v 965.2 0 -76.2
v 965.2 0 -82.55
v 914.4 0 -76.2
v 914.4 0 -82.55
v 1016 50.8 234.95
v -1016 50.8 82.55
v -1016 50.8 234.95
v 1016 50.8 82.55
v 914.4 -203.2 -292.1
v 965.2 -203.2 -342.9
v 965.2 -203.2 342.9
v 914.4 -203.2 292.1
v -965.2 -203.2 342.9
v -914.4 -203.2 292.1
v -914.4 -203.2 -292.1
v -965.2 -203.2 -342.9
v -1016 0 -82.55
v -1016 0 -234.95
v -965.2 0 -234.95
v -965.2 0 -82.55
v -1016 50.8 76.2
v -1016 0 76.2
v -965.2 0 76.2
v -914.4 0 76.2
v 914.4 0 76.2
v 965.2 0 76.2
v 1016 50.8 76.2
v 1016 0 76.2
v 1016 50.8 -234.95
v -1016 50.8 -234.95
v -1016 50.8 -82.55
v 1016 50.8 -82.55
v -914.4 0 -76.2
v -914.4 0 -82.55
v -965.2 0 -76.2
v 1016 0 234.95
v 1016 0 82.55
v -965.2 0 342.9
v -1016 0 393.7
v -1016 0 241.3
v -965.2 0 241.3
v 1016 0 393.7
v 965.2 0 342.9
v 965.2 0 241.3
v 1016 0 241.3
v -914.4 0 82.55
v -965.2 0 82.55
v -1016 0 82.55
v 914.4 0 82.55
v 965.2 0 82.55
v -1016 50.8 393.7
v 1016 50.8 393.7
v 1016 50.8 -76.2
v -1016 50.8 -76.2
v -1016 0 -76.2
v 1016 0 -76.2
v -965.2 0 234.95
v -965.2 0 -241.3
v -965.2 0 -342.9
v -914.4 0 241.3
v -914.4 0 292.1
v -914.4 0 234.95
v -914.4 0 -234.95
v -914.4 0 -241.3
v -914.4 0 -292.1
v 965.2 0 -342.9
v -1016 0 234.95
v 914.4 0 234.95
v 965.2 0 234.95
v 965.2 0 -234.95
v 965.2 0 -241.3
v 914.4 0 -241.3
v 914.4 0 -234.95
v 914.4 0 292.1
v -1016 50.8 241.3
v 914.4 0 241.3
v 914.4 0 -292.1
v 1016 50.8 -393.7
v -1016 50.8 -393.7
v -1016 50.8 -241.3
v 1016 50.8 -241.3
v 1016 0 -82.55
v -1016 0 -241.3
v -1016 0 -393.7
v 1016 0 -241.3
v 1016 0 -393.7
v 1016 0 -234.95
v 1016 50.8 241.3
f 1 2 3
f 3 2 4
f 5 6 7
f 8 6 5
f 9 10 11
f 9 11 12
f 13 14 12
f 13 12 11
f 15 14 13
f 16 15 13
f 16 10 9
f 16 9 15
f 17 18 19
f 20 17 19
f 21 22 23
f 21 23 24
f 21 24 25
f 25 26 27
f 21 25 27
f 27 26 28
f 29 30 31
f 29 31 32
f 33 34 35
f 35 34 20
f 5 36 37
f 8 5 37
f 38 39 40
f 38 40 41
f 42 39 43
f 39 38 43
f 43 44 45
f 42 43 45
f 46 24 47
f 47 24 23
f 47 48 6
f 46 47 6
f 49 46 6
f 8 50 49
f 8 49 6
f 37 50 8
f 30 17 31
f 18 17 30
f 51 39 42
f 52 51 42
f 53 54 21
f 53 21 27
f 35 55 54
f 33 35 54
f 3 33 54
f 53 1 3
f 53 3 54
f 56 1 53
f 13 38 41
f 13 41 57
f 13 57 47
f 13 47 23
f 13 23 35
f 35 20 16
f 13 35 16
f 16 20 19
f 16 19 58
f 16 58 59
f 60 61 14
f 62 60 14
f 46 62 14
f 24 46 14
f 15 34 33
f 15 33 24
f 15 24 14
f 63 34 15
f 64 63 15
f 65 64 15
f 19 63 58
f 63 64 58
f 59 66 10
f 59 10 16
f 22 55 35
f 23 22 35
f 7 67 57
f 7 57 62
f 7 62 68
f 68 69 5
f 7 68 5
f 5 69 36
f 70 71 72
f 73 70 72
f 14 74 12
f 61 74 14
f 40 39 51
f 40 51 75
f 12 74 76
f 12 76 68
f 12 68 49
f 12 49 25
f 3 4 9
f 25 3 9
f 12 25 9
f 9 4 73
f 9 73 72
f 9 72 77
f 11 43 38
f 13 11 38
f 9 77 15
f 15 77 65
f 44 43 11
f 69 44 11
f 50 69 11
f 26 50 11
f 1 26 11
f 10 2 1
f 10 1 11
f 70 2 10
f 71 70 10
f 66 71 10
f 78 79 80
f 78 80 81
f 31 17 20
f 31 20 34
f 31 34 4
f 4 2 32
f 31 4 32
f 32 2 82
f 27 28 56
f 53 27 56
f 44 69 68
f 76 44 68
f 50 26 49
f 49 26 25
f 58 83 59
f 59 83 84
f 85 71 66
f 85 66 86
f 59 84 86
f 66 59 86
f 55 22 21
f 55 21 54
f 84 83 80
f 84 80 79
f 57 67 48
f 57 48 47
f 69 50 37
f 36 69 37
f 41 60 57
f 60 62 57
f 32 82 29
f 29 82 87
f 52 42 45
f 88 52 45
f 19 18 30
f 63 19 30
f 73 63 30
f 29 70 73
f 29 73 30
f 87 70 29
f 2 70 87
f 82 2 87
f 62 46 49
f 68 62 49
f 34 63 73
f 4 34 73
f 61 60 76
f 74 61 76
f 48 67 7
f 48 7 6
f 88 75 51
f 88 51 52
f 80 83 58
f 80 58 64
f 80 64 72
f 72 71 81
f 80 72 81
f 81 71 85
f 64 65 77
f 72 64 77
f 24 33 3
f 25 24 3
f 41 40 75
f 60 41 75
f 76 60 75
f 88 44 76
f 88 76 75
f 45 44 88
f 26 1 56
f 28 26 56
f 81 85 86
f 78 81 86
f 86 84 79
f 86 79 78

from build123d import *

# Parameters (mm, degrees)
SKETCH1_W             = 2032
SKETCH1_H             = 152.4
BOSS_EXTRUDE1_DEPTH   = 50.8
BOSS_EXTRUDE1_2_DEPTH = 50.8
BOSS_EXTRUDE1_3_DEPTH = 50.8
BOSS_EXTRUDE1_4_DEPTH = 50.8
BOSS_EXTRUDE1_5_DEPTH = 50.8
SKETCH2_W             = 1930.4
SKETCH2_H             = 685.8
SKETCH2_W_2           = 1828.8
SKETCH2_H_2           = 584.2
BOSS_EXTRUDE2_DEPTH   = 203.2


with BuildPart() as part:
    # Sketch1 → Boss-Extrude1 (new body)
    with BuildSketch(Plane(origin=(0, 0, 0), x_dir=(1, 0, 0), z_dir=(0, 1, 0))):
        Rectangle(SKETCH1_W, SKETCH1_H)
    extrude(amount=BOSS_EXTRUDE1_DEPTH)



with BuildPart() as body_2:
    # Sketch1 → Boss-Extrude1 2 (new body)
    with BuildSketch(Plane(origin=(0, 0, 0), x_dir=(1, 0, 0), z_dir=(0, 1, 0))):
        with Locations((0, 158.75)):
            Rectangle(SKETCH1_W, SKETCH1_H)
    extrude(amount=BOSS_EXTRUDE1_2_DEPTH)


with BuildPart() as body_3:
    # Sketch1 → Boss-Extrude1 3 (new body)
    with BuildSketch(Plane(origin=(0, 0, 0), x_dir=(1, 0, 0), z_dir=(0, 1, 0))):
        with Locations((0, 317.5)):
            Rectangle(SKETCH1_W, SKETCH1_H)
    extrude(amount=BOSS_EXTRUDE1_3_DEPTH)


with BuildPart() as body_4:
    # Sketch1 → Boss-Extrude1 4 (new body)
    with BuildSketch(Plane(origin=(0, 0, 0), x_dir=(1, 0, 0), z_dir=(0, 1, 0))):
        with Locations((0, -158.75)):
            Rectangle(SKETCH1_W, SKETCH1_H)
    extrude(amount=BOSS_EXTRUDE1_4_DEPTH)


with BuildPart() as body_5:
    # Sketch1 → Boss-Extrude1 5 (new body)
    with BuildSketch(Plane(origin=(0, 0, 0), x_dir=(1, 0, 0), z_dir=(0, 1, 0))):
        with Locations((0, -317.5)):
            Rectangle(SKETCH1_W, SKETCH1_H)
    extrude(amount=BOSS_EXTRUDE1_5_DEPTH)


with BuildPart() as part_1:
    add(part.part)

    add(body_2.part)  # Boss-Extrude2 merges body 2

    add(body_3.part)  # Boss-Extrude2 merges body 3

    add(body_4.part)  # Boss-Extrude2 merges body 4

    add(body_5.part)  # Boss-Extrude2 merges body 5
    # Sketch2 → Boss-Extrude2 (add)
    with BuildSketch(Plane(origin=(0, 0, 0), x_dir=(-1, 0, 0), z_dir=(0, -1, 0))):
        Rectangle(SKETCH2_W, SKETCH2_H)
        Rectangle(SKETCH2_W_2, SKETCH2_H_2, mode=Mode.SUBTRACT)
    extrude(amount=BOSS_EXTRUDE2_DEPTH)


solid = part_1.part
